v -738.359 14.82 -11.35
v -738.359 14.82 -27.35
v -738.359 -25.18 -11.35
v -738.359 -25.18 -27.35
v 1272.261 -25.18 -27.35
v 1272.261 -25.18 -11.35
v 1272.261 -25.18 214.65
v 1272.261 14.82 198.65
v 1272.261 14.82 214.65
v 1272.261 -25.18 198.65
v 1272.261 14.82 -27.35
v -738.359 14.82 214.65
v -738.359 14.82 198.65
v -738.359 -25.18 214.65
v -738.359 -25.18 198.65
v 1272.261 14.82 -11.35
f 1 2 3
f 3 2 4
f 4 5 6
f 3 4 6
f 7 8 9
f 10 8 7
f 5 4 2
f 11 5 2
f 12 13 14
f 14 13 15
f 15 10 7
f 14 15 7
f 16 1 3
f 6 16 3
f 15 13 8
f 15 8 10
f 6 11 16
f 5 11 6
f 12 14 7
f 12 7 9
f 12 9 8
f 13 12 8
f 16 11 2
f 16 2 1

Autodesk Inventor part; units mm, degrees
ref_plane "YZ Plane" through (0, 0, 0) normal (1, 0, 0) x (0, 1, 0)
ref_plane "XZ Plane" through (0, 0, 0) normal (0, 1, 0) x (-1, 0, 0)
ref_plane "РабПлоскость2" through (1272.2614, -25.1804, 198.6497) normal (1, 0, 0) x (0, -1, 0)
sketch "Эскиз2" plane through (1272.2614, -25.1804, 198.6497) normal (1, 0, 0) x (0, -1, 0)
  line L0 (-3, -16) -> (0, -16) projected
  line L1 (0, 226) -> (0, -16) projected
  line L2 (0, -16) -> (-40, -16)
  line L3 (-40, -16) -> (-40, 0)
  line L4 (-40, 0) -> (0, 0)
  line L5 (0, 0) -> (0, -16)
  line L6 (0, 226) -> (-40, 226)
  line L7 (-40, 226) -> (-40, 210)
  line L8 (-40, 210) -> (0, 210)
  line L9 (0, 210) -> (0, 226)
  point P0 (-25.1804, 198.6497)
  point P1 (0, 0)
  dimension "d0" = 16
  dimension "d1" = 40
  dimension "d4" = 16
  dimension "d5" = 40
ref_plane "РабПлоскость3" through (-738.3586, -22.1804, 198.6497) normal (-1, 0, 0) x (0, 0, 1)
extrude "Выдавливание1" add sketch "Эскиз2" against normal up to surface (2010.62 mm away)
properties part number "брусок"
